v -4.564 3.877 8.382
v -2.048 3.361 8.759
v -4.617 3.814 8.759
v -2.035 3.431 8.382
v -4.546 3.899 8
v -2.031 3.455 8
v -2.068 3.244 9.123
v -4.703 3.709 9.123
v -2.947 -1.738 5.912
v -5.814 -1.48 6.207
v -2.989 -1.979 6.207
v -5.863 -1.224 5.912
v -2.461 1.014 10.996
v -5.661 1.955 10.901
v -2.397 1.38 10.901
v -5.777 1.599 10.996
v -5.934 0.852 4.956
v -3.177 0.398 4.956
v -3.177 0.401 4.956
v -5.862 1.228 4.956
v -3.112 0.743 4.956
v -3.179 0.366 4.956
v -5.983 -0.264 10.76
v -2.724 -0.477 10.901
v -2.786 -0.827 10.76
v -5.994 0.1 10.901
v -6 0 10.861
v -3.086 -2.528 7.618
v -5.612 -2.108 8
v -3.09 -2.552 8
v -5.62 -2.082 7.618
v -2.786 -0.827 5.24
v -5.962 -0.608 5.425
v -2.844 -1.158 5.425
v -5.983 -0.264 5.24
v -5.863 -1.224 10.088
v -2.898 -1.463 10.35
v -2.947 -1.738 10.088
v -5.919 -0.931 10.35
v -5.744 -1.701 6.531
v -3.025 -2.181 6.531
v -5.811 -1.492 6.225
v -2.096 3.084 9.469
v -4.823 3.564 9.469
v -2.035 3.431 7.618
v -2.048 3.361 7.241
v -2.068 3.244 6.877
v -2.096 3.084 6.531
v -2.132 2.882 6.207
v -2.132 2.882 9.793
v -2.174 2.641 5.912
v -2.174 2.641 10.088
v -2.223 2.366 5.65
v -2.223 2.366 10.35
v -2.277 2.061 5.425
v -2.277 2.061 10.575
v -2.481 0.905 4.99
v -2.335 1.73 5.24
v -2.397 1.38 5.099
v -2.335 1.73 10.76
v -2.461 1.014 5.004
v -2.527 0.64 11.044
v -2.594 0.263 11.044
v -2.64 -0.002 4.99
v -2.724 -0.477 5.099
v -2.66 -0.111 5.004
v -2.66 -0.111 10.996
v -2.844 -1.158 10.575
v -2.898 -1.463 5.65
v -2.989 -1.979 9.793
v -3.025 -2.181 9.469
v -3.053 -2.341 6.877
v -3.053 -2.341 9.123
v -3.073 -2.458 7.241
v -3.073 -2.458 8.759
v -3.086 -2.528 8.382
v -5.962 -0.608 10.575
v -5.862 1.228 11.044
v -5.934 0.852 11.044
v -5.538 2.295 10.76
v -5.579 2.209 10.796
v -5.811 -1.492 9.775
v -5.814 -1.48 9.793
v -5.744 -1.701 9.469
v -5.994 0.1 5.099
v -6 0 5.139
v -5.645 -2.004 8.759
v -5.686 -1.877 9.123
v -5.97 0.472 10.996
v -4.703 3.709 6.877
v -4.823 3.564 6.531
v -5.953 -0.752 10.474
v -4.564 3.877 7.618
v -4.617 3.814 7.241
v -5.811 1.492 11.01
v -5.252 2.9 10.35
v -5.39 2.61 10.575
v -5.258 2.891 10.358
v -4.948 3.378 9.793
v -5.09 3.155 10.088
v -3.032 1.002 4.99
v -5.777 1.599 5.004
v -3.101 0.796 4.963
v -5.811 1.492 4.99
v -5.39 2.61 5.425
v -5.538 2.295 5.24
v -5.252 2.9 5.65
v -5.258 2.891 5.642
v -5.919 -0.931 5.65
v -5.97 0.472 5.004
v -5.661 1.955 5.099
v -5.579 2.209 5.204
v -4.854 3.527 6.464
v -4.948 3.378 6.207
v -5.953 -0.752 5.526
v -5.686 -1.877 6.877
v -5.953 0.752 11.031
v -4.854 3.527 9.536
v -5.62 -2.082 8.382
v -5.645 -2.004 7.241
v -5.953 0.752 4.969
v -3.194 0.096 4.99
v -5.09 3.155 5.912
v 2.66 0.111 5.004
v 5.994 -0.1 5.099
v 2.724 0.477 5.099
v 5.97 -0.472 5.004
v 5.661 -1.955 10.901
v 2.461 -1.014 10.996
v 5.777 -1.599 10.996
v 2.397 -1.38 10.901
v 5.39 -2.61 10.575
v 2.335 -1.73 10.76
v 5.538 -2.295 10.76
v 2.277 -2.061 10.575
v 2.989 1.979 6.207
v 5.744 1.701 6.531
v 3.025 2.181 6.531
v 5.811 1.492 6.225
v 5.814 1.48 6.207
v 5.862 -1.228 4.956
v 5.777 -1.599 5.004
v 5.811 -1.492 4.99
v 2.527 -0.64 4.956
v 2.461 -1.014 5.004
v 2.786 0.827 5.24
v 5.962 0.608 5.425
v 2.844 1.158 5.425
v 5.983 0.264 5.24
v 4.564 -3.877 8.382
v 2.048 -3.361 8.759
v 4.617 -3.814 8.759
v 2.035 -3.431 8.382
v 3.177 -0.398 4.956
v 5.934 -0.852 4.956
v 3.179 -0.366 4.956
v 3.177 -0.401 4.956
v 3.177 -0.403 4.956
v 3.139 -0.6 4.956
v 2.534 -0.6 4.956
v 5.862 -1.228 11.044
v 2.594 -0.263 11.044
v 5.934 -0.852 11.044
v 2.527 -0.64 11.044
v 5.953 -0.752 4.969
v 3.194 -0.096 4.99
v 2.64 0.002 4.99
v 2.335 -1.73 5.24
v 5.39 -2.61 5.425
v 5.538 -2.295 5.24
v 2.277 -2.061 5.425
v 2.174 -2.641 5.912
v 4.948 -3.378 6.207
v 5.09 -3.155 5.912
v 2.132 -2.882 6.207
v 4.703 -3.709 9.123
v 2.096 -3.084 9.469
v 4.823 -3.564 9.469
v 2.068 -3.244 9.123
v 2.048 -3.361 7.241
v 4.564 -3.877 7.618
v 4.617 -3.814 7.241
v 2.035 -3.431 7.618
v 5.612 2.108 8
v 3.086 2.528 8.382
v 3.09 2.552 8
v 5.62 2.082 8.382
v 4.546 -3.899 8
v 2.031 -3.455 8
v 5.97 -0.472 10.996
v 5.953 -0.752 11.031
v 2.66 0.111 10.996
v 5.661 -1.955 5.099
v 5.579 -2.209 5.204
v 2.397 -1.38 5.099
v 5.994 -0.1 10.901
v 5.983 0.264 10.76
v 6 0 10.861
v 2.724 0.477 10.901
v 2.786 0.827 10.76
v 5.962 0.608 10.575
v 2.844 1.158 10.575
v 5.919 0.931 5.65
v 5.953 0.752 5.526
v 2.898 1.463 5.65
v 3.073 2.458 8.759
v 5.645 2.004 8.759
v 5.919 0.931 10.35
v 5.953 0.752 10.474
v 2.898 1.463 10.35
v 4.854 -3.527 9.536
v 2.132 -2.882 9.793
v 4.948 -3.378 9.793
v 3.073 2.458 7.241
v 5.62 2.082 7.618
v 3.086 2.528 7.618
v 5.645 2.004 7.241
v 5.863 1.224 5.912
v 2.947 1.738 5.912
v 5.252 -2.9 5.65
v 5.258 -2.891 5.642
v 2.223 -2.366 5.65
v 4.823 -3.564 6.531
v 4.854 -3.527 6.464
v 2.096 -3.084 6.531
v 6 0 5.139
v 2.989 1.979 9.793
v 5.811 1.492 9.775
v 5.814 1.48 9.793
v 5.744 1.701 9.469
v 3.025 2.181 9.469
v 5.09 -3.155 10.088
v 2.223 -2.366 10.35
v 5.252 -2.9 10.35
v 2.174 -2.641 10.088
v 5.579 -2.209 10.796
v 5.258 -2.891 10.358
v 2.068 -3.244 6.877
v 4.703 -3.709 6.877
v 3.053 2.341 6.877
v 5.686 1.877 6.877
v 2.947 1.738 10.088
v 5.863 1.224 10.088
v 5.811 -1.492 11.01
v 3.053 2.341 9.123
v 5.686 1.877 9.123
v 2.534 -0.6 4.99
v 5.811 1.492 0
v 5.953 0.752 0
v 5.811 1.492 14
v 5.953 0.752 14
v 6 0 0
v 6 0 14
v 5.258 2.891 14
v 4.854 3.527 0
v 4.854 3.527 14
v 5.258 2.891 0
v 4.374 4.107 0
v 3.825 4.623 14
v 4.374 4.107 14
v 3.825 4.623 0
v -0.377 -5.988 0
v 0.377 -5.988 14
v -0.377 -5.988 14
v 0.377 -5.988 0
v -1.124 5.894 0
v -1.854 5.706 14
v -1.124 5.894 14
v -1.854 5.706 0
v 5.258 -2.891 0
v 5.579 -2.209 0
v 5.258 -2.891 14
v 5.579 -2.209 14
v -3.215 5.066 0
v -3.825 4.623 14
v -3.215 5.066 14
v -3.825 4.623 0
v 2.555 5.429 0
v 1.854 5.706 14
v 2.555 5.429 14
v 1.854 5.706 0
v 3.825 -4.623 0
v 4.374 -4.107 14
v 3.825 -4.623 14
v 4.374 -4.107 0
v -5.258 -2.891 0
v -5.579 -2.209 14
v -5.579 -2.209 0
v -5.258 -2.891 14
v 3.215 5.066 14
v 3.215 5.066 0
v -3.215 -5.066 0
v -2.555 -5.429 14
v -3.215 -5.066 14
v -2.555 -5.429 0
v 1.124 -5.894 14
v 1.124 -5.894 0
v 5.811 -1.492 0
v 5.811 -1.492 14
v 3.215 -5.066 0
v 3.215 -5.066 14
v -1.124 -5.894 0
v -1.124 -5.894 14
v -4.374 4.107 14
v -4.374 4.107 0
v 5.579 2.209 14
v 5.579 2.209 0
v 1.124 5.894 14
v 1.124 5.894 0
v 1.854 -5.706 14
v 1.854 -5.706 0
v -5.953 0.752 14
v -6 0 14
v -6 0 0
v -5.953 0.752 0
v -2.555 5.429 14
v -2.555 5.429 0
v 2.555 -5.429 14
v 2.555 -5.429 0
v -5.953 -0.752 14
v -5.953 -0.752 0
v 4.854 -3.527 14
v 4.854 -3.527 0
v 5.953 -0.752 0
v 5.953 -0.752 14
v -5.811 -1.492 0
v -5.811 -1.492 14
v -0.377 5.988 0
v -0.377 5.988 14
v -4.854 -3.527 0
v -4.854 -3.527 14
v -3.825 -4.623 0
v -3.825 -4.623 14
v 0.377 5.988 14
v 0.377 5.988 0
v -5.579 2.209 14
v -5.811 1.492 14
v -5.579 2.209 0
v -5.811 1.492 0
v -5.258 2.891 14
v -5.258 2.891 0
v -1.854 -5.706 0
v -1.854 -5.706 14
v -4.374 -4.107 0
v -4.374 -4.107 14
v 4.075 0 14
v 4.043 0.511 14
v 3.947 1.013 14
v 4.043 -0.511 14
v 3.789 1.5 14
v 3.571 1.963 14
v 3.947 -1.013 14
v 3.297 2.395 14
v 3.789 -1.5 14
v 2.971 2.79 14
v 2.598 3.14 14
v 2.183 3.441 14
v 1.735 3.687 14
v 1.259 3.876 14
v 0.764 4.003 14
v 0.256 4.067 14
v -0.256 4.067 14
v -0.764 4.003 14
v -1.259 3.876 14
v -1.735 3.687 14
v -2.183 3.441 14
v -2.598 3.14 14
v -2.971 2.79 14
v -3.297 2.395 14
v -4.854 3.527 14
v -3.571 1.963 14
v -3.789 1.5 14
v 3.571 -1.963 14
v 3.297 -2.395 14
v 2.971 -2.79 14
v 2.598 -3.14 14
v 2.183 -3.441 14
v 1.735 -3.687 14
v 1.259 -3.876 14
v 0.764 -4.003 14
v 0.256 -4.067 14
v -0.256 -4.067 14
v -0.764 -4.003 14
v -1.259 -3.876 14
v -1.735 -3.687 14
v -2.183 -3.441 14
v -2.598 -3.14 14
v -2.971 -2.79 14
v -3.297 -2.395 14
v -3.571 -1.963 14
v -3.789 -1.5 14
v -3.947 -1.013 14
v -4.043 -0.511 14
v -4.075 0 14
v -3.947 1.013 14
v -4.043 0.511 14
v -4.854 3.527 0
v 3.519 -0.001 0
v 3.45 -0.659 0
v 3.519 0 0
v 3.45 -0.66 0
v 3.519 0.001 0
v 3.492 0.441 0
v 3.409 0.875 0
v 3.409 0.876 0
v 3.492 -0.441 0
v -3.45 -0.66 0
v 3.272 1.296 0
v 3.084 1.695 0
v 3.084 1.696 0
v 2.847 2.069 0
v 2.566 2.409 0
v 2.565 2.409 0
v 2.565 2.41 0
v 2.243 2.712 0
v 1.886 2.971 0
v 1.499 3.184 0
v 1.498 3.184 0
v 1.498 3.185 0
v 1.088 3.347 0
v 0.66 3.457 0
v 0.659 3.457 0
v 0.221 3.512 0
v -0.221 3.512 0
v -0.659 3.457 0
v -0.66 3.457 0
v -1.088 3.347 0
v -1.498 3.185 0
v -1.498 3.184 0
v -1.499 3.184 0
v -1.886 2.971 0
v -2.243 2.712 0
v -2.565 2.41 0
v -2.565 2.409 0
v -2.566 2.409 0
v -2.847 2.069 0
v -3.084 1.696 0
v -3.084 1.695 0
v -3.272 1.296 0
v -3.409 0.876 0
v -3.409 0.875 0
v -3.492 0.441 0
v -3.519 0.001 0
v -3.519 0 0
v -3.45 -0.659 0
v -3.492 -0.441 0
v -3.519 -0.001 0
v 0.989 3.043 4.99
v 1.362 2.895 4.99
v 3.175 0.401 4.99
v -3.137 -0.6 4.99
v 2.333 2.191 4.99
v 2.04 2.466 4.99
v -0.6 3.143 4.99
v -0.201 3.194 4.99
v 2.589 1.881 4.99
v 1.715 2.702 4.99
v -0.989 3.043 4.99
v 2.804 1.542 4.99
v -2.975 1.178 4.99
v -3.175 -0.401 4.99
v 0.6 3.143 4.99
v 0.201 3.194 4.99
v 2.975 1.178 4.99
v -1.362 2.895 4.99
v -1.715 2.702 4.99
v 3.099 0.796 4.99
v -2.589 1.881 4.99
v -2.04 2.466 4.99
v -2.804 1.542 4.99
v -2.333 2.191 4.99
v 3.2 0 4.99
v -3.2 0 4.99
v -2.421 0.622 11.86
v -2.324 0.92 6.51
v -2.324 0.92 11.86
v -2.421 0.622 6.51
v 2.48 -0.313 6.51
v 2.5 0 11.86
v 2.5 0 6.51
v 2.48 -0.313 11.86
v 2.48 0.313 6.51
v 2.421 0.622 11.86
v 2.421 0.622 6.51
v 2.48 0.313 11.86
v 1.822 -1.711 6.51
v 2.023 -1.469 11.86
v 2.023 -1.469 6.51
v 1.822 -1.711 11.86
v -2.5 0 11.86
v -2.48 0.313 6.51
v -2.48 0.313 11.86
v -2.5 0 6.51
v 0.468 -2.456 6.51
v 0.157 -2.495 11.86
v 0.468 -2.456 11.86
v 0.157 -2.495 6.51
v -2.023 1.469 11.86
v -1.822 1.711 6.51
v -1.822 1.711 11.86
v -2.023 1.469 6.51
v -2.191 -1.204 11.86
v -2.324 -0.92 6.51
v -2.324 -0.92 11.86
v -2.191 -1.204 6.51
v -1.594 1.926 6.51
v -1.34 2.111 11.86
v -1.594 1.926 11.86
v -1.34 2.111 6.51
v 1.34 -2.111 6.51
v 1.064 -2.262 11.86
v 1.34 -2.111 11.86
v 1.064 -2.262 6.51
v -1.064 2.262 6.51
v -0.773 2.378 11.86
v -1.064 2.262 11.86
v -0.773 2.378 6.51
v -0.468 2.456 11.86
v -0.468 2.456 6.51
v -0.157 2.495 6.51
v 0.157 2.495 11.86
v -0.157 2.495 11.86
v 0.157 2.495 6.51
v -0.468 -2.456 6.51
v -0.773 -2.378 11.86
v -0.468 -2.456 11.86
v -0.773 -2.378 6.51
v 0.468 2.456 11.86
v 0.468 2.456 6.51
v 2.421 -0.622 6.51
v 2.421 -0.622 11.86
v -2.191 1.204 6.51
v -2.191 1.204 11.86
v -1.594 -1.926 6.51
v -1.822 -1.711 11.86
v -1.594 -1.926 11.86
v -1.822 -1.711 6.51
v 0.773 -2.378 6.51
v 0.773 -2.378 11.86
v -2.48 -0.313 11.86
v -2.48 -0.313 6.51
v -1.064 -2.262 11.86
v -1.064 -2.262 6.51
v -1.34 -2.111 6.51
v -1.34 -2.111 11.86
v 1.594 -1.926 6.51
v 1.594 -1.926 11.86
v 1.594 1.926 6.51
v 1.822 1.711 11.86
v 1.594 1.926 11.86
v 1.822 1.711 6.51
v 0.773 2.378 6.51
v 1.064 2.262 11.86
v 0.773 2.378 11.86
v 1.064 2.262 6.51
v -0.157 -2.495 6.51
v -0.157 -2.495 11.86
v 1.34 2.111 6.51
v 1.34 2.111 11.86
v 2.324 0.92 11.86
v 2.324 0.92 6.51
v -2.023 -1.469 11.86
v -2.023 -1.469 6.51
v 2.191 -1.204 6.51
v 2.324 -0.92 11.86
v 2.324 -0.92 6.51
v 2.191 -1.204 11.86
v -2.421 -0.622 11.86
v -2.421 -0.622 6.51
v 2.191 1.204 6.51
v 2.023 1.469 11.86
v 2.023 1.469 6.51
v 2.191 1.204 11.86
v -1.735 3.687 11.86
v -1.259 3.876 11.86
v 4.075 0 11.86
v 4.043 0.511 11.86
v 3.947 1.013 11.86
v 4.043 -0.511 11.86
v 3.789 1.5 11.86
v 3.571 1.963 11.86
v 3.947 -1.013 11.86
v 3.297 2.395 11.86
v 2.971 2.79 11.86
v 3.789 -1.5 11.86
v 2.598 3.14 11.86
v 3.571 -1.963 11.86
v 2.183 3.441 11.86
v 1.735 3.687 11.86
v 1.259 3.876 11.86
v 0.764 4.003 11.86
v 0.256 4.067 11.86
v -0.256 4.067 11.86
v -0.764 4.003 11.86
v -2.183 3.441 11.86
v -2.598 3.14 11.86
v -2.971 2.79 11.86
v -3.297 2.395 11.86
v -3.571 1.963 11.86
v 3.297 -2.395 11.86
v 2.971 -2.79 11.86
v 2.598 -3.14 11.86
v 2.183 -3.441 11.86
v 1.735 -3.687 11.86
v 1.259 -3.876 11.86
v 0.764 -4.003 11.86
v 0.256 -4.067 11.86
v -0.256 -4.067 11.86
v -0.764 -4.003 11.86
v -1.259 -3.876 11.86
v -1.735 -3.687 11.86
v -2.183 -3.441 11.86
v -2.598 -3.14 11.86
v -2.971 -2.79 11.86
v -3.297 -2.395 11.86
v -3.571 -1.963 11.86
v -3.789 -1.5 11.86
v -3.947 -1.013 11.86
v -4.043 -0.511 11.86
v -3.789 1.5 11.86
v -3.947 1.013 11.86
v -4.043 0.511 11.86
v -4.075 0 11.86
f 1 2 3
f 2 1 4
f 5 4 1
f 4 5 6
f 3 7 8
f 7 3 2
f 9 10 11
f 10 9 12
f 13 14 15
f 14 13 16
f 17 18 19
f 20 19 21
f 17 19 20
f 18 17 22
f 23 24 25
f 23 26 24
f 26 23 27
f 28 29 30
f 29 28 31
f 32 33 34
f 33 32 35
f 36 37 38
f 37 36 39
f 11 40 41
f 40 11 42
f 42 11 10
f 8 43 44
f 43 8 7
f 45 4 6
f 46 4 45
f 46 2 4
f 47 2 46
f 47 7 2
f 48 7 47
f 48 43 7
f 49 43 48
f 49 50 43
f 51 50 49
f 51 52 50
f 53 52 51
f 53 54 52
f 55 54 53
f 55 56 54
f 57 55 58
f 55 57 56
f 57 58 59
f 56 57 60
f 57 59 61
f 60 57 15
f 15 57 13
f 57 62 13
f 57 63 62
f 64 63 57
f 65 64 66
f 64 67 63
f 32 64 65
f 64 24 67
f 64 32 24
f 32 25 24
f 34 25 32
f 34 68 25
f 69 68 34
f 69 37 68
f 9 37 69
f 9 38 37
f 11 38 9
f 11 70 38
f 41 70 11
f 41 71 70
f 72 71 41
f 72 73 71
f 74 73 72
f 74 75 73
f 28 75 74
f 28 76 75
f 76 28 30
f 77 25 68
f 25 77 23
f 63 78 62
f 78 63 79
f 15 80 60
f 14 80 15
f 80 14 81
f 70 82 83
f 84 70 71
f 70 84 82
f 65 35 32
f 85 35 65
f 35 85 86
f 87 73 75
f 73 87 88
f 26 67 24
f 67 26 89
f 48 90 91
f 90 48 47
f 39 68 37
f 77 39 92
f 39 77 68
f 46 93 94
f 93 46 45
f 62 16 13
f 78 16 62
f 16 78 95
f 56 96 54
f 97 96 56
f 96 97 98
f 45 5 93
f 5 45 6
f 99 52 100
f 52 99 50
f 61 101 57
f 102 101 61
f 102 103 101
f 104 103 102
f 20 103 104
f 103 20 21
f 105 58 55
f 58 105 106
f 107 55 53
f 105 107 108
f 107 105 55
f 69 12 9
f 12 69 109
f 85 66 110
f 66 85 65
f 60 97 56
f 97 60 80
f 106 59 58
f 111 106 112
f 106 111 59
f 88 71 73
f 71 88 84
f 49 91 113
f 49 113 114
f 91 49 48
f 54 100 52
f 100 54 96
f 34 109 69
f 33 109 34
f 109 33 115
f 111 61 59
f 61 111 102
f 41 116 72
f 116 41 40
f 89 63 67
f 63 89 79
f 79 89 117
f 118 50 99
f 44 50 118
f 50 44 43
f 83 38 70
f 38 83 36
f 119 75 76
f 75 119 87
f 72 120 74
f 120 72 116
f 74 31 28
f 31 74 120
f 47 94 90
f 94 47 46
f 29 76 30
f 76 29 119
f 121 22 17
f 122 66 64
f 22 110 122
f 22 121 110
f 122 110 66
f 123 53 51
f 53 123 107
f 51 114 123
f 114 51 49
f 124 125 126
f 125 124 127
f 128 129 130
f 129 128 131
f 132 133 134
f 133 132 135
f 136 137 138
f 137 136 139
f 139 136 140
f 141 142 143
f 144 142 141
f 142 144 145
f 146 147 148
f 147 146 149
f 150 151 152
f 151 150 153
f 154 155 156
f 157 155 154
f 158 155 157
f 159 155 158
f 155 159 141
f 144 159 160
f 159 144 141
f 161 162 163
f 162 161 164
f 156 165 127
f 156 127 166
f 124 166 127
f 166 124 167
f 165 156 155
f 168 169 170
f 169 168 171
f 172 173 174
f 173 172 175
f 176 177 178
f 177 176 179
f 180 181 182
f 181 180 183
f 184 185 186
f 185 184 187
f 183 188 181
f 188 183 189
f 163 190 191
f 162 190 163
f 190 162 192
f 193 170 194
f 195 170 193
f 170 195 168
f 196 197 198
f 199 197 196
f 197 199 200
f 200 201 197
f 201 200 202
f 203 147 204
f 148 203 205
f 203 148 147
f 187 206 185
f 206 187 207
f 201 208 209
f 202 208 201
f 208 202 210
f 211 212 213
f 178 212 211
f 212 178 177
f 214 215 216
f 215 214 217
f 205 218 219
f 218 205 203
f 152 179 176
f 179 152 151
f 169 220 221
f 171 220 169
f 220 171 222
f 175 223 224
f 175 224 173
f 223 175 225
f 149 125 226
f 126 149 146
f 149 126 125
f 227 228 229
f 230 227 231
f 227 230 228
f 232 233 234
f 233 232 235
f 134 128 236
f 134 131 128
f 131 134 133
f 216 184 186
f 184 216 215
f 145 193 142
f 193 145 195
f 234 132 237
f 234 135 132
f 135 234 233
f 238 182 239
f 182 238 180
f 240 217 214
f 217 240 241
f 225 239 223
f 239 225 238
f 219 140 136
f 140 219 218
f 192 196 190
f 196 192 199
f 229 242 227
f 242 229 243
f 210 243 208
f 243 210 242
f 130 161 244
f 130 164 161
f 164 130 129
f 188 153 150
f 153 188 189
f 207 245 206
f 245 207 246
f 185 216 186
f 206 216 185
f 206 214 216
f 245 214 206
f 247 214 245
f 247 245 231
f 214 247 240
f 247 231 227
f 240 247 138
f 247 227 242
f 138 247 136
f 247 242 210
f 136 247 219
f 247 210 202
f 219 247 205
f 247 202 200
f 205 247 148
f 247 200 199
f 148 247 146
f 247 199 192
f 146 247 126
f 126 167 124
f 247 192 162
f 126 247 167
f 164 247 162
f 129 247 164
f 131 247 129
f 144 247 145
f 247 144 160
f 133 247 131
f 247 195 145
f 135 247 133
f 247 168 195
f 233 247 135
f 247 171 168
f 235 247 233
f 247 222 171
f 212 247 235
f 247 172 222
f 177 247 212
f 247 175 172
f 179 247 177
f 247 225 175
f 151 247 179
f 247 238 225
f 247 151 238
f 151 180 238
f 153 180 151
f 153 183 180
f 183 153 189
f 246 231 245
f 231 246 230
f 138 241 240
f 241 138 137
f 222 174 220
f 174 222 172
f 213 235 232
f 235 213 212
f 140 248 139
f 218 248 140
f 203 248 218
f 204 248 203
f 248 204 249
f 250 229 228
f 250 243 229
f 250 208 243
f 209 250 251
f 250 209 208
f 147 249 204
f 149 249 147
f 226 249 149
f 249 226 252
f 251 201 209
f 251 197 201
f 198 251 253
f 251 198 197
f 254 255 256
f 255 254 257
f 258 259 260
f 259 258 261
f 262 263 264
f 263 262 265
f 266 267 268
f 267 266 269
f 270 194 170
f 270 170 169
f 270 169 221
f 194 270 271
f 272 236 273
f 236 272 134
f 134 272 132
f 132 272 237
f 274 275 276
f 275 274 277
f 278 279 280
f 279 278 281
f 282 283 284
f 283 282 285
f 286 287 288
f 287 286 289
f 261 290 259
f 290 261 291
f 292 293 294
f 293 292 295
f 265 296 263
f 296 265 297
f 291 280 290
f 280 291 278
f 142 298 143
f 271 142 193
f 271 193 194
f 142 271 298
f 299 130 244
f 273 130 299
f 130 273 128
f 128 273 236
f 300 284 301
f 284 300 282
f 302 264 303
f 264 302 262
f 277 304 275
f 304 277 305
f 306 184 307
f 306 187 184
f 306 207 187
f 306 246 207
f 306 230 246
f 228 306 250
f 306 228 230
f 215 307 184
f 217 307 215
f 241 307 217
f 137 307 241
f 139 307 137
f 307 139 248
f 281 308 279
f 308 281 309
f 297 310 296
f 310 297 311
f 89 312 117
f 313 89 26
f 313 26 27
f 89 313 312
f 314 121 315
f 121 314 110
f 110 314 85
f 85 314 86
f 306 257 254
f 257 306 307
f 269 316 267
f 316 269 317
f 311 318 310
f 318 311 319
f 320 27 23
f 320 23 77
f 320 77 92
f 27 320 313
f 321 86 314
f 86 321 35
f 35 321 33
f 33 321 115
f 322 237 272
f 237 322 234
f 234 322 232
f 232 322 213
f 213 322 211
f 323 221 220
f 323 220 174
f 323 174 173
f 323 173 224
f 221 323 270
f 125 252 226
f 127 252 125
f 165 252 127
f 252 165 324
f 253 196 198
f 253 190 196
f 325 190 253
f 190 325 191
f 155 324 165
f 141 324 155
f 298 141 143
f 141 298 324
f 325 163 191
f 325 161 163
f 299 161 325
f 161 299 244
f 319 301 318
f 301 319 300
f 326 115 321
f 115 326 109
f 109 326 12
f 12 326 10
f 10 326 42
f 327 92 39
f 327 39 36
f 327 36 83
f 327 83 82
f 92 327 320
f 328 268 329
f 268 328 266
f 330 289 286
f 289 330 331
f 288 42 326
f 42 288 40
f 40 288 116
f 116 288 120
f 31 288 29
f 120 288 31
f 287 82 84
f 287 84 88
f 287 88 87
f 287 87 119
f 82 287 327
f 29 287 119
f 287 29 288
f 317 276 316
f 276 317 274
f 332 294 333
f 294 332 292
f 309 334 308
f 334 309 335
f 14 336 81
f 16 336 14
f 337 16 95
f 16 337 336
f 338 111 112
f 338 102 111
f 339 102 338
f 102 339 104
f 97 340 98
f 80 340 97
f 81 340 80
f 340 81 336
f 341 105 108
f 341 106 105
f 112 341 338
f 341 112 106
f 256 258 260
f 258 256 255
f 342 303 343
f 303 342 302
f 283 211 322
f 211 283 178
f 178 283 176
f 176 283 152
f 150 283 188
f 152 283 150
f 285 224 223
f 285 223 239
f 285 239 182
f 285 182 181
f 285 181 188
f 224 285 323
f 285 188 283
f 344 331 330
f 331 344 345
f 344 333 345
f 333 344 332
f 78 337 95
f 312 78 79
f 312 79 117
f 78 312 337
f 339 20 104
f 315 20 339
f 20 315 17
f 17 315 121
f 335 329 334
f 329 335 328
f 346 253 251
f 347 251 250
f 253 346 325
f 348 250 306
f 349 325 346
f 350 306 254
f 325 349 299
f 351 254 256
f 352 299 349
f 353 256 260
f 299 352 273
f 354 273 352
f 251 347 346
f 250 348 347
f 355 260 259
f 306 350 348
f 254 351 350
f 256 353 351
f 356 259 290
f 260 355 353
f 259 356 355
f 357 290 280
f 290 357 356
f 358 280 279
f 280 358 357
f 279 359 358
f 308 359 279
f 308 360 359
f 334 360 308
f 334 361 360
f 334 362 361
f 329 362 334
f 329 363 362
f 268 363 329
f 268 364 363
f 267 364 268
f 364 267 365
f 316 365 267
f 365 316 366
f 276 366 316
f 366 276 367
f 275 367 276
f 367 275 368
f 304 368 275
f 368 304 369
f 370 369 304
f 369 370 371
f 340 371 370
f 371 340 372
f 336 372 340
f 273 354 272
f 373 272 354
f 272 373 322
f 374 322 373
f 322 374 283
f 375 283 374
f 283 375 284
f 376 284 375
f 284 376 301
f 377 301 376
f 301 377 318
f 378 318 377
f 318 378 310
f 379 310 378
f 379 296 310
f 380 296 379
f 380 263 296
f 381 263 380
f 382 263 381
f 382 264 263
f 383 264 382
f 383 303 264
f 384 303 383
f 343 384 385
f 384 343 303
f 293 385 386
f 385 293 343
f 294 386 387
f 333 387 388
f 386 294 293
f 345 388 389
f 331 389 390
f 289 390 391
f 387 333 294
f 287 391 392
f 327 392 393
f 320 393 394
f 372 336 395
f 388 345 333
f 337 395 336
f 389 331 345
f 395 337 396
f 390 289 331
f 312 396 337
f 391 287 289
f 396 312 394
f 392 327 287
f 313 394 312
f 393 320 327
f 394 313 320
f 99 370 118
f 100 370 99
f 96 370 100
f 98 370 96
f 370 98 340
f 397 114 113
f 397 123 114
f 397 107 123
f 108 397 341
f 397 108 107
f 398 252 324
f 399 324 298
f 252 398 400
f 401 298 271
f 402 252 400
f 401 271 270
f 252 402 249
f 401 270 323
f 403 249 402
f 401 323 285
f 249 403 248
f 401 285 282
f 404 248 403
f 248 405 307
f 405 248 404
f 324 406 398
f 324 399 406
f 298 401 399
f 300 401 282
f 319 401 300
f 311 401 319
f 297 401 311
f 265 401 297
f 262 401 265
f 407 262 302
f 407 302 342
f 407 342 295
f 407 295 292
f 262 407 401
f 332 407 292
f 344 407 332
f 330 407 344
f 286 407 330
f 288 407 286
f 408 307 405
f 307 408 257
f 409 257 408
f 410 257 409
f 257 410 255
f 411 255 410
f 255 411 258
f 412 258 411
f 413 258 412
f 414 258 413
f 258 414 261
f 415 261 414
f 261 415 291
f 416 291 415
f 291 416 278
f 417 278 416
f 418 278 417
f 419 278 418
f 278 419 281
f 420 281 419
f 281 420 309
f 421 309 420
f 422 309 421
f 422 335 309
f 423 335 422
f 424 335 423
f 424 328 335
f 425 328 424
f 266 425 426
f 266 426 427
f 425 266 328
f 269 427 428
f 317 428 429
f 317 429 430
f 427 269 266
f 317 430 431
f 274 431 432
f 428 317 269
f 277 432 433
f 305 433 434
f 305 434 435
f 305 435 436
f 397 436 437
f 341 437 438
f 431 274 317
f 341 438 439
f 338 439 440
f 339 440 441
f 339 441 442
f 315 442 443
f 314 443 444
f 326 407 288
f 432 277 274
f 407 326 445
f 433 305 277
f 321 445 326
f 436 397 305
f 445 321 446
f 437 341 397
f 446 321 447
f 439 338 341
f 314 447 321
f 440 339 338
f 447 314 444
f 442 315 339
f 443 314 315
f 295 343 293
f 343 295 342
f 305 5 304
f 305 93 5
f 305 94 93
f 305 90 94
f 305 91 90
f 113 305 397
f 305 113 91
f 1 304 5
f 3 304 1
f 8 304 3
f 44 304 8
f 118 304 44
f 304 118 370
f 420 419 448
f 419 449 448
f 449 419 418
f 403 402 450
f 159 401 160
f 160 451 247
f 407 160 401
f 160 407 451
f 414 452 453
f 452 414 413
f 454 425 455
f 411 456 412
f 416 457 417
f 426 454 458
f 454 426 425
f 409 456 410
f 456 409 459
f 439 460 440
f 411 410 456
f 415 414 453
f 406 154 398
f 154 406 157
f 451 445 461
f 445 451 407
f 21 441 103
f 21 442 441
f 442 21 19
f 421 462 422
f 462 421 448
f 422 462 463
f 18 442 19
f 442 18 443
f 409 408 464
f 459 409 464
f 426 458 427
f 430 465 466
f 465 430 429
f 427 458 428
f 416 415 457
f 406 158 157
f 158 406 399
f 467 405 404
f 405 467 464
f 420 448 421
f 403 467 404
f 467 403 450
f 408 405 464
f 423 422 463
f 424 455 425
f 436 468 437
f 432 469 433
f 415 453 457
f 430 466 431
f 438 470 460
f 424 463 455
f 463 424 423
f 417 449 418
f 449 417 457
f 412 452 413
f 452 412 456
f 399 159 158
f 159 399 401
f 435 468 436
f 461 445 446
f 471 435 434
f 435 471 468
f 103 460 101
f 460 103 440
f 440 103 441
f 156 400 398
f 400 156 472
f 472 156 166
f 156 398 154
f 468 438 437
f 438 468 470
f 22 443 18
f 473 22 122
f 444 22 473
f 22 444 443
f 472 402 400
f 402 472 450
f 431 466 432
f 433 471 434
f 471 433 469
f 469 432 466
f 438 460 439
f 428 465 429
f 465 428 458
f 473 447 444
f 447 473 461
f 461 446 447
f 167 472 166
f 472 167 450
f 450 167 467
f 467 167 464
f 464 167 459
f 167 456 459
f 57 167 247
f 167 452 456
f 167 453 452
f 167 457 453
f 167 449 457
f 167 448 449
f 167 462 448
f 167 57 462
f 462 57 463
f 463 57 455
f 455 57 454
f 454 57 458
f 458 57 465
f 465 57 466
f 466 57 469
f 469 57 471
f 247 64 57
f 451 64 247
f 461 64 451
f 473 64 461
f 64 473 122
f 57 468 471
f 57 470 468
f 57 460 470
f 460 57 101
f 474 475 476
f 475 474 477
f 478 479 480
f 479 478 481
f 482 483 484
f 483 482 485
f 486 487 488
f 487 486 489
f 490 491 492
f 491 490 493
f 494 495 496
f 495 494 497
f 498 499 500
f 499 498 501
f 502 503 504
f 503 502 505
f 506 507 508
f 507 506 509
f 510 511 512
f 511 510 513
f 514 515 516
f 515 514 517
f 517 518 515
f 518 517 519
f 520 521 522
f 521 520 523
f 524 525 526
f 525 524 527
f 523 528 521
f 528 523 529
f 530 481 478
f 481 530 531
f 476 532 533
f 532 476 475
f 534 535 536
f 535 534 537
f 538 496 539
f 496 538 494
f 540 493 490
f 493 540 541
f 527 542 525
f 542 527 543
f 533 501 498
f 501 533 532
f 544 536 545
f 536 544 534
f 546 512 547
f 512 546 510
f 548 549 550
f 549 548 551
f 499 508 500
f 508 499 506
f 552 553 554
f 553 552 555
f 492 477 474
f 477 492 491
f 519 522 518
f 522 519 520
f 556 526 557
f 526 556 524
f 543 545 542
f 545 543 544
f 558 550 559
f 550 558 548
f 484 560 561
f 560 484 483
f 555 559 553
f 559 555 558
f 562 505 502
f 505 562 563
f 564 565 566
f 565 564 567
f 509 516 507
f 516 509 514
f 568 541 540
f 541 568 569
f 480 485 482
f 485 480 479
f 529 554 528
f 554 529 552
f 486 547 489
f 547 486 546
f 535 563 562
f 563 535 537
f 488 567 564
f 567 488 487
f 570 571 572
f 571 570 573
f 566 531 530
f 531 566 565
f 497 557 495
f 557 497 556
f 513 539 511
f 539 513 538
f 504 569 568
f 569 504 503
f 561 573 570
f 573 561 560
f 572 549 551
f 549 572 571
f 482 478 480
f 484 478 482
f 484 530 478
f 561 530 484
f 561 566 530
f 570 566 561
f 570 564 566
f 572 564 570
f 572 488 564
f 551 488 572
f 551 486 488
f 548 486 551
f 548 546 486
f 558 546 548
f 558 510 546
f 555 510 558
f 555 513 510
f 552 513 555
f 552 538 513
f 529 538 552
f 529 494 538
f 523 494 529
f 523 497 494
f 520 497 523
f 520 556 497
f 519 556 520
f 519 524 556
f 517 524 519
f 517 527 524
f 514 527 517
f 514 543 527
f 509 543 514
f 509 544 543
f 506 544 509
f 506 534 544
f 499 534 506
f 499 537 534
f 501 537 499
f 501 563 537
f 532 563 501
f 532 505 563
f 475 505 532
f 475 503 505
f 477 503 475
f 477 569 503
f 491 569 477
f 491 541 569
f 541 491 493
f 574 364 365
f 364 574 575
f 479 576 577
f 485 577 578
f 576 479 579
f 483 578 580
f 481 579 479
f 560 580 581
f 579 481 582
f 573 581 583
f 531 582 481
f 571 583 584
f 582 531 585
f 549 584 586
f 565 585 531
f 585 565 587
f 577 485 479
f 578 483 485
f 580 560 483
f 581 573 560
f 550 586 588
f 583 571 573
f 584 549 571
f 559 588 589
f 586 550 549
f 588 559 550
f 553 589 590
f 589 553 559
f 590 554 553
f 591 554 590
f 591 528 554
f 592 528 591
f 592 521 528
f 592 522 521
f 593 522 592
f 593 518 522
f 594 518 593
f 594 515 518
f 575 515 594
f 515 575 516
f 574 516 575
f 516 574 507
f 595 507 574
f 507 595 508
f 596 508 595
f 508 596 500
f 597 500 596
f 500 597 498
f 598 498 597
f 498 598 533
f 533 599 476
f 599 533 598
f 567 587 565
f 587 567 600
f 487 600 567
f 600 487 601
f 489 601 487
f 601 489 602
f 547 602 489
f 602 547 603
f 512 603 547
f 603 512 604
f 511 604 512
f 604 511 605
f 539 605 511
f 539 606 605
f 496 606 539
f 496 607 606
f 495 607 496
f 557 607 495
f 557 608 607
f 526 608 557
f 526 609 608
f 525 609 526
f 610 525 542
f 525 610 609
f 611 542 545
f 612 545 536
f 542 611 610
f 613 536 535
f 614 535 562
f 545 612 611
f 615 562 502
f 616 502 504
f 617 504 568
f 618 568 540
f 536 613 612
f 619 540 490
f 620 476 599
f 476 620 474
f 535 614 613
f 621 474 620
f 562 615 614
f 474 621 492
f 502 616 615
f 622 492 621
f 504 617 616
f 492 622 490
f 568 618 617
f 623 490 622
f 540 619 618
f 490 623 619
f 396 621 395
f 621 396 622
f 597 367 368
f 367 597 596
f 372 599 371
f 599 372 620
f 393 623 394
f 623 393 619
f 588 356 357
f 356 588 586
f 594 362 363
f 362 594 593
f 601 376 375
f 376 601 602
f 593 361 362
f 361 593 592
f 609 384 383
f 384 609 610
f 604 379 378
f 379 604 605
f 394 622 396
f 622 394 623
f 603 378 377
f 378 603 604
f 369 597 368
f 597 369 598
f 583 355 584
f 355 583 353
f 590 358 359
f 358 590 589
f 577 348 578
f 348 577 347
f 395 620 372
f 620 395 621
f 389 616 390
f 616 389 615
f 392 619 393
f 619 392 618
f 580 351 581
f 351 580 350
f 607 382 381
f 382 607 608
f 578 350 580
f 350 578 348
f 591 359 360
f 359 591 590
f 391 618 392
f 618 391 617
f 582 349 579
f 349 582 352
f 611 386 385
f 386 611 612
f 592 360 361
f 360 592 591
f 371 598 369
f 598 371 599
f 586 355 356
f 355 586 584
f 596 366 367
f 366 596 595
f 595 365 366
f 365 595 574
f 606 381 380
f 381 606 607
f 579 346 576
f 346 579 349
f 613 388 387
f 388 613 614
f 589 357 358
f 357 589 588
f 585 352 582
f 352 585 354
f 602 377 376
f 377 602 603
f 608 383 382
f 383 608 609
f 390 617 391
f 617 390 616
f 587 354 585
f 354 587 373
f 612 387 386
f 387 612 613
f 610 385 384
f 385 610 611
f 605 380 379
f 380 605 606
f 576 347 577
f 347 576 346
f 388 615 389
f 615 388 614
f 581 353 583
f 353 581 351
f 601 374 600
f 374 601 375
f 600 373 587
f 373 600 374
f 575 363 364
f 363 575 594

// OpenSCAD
// file: magnet-holder-6mm-dual.scad
$fn = 50;

MAG_DIAMETER = 6.1;
MAG_HEIGHT = 2;

ASSEMBLY_WIDTH = 22; // width of the assembly up to the flange

SENSOR_OFFSET = 8; // where the midpoint of the sensor will sit
SENSOR_HOLE_DIAMETER = 5;
SENSOR_WIDTH = 4;  // physical outer dimensions of the sensor
SENSOR_HEIGHT = 3;

SENSOR_HOLDER_DIAMETER = 14;
SENSOR_HOLDER_FLANGE_DIAMETER = 20; // bit outside the base
BASE_HOLE_DIAMETER = 16.1;
BASE_INTERFERENCE_WIDTH = 4;

HOLDER_OVERLAP = 2;
OVERLAP_DIAMETER = 8;

MAG_HOLDER_DIAMETER = 12;
MAG_HOLDER_LENGTH = 14;
MAG_ROTATION_OFFSET = 80;

POT_SHAFT_HEIGHT = 5;
POT_SHAFT_DIAMETER = 6.4;
POT_SHAFT_RECESS = 2.6;


module copy_mirror(vec=[0,1,0]) 
{ 
    children(); 
    mirror(vec) children(); 
}

module pot_shaft_hole() {

    radius = POT_SHAFT_DIAMETER / 2;
    width = POT_SHAFT_DIAMETER - POT_SHAFT_RECESS;

    translate([0,0,POT_SHAFT_HEIGHT])
    rotate([180,0,0])
    linear_extrude(height = POT_SHAFT_HEIGHT, scale = 1.1) 
    intersection() {
        circle(radius);
        translate([-radius, -radius]) square([POT_SHAFT_DIAMETER, width]);
    }

}

module mag_holder() {

    difference() {
        cylinder(d = MAG_HOLDER_DIAMETER, h = MAG_HOLDER_LENGTH);
        translate([0, 0, -0.01])
        pot_shaft_hole();

        // holes for magnets
        rotate([0, 0, MAG_ROTATION_OFFSET])
        copy_mirror()
        translate([0, MAG_DIAMETER, SENSOR_OFFSET]) 
        rotate([90, 0, 0]) 
        cylinder(d = MAG_DIAMETER, h = (MAG_HOLDER_DIAMETER - SENSOR_HOLE_DIAMETER) /2 );

        translate([0, 0, MAG_HOLDER_LENGTH + 0.01])
        rotate([0, 180, 0])
        cylinder(d = SENSOR_HOLE_DIAMETER, h = MAG_HOLDER_LENGTH - SENSOR_OFFSET + (SENSOR_HEIGHT /2 ));

        translate([0, 0, MAG_HOLDER_LENGTH + 0.01])
        rotate([0, 180, 0])
        cylinder(d = OVERLAP_DIAMETER + 0.15, h = HOLDER_OVERLAP + 0.15);

    }
    
}


module sensor_holder() {
    overlap = HOLDER_OVERLAP - 0.15;
    main_width = ASSEMBLY_WIDTH - MAG_HOLDER_LENGTH - BASE_INTERFERENCE_WIDTH;
    cylinder(d = OVERLAP_DIAMETER - 0.15, h = overlap);
    translate([0, 0, overlap])
    cylinder(d = SENSOR_HOLDER_DIAMETER, h = main_width, $fn = 6);
    translate([0, 0, overlap + main_width])
    cylinder(d = BASE_HOLE_DIAMETER, h = BASE_INTERFERENCE_WIDTH);
    translate([0, 0, overlap + main_width + BASE_INTERFERENCE_WIDTH])
    cylinder(d = SENSOR_HOLDER_FLANGE_DIAMETER, h = 2, $fn = 6);

}

mag_holder();
translate([0, 0, MAG_HOLDER_LENGTH + HOLDER_OVERLAP]) 
sensor_holder();
// main file
// convience script 

use <magnet-holder-6mm-dual.scad>;

!mag_holder();
rotate([180, 0, 0]) sensor_holder();
